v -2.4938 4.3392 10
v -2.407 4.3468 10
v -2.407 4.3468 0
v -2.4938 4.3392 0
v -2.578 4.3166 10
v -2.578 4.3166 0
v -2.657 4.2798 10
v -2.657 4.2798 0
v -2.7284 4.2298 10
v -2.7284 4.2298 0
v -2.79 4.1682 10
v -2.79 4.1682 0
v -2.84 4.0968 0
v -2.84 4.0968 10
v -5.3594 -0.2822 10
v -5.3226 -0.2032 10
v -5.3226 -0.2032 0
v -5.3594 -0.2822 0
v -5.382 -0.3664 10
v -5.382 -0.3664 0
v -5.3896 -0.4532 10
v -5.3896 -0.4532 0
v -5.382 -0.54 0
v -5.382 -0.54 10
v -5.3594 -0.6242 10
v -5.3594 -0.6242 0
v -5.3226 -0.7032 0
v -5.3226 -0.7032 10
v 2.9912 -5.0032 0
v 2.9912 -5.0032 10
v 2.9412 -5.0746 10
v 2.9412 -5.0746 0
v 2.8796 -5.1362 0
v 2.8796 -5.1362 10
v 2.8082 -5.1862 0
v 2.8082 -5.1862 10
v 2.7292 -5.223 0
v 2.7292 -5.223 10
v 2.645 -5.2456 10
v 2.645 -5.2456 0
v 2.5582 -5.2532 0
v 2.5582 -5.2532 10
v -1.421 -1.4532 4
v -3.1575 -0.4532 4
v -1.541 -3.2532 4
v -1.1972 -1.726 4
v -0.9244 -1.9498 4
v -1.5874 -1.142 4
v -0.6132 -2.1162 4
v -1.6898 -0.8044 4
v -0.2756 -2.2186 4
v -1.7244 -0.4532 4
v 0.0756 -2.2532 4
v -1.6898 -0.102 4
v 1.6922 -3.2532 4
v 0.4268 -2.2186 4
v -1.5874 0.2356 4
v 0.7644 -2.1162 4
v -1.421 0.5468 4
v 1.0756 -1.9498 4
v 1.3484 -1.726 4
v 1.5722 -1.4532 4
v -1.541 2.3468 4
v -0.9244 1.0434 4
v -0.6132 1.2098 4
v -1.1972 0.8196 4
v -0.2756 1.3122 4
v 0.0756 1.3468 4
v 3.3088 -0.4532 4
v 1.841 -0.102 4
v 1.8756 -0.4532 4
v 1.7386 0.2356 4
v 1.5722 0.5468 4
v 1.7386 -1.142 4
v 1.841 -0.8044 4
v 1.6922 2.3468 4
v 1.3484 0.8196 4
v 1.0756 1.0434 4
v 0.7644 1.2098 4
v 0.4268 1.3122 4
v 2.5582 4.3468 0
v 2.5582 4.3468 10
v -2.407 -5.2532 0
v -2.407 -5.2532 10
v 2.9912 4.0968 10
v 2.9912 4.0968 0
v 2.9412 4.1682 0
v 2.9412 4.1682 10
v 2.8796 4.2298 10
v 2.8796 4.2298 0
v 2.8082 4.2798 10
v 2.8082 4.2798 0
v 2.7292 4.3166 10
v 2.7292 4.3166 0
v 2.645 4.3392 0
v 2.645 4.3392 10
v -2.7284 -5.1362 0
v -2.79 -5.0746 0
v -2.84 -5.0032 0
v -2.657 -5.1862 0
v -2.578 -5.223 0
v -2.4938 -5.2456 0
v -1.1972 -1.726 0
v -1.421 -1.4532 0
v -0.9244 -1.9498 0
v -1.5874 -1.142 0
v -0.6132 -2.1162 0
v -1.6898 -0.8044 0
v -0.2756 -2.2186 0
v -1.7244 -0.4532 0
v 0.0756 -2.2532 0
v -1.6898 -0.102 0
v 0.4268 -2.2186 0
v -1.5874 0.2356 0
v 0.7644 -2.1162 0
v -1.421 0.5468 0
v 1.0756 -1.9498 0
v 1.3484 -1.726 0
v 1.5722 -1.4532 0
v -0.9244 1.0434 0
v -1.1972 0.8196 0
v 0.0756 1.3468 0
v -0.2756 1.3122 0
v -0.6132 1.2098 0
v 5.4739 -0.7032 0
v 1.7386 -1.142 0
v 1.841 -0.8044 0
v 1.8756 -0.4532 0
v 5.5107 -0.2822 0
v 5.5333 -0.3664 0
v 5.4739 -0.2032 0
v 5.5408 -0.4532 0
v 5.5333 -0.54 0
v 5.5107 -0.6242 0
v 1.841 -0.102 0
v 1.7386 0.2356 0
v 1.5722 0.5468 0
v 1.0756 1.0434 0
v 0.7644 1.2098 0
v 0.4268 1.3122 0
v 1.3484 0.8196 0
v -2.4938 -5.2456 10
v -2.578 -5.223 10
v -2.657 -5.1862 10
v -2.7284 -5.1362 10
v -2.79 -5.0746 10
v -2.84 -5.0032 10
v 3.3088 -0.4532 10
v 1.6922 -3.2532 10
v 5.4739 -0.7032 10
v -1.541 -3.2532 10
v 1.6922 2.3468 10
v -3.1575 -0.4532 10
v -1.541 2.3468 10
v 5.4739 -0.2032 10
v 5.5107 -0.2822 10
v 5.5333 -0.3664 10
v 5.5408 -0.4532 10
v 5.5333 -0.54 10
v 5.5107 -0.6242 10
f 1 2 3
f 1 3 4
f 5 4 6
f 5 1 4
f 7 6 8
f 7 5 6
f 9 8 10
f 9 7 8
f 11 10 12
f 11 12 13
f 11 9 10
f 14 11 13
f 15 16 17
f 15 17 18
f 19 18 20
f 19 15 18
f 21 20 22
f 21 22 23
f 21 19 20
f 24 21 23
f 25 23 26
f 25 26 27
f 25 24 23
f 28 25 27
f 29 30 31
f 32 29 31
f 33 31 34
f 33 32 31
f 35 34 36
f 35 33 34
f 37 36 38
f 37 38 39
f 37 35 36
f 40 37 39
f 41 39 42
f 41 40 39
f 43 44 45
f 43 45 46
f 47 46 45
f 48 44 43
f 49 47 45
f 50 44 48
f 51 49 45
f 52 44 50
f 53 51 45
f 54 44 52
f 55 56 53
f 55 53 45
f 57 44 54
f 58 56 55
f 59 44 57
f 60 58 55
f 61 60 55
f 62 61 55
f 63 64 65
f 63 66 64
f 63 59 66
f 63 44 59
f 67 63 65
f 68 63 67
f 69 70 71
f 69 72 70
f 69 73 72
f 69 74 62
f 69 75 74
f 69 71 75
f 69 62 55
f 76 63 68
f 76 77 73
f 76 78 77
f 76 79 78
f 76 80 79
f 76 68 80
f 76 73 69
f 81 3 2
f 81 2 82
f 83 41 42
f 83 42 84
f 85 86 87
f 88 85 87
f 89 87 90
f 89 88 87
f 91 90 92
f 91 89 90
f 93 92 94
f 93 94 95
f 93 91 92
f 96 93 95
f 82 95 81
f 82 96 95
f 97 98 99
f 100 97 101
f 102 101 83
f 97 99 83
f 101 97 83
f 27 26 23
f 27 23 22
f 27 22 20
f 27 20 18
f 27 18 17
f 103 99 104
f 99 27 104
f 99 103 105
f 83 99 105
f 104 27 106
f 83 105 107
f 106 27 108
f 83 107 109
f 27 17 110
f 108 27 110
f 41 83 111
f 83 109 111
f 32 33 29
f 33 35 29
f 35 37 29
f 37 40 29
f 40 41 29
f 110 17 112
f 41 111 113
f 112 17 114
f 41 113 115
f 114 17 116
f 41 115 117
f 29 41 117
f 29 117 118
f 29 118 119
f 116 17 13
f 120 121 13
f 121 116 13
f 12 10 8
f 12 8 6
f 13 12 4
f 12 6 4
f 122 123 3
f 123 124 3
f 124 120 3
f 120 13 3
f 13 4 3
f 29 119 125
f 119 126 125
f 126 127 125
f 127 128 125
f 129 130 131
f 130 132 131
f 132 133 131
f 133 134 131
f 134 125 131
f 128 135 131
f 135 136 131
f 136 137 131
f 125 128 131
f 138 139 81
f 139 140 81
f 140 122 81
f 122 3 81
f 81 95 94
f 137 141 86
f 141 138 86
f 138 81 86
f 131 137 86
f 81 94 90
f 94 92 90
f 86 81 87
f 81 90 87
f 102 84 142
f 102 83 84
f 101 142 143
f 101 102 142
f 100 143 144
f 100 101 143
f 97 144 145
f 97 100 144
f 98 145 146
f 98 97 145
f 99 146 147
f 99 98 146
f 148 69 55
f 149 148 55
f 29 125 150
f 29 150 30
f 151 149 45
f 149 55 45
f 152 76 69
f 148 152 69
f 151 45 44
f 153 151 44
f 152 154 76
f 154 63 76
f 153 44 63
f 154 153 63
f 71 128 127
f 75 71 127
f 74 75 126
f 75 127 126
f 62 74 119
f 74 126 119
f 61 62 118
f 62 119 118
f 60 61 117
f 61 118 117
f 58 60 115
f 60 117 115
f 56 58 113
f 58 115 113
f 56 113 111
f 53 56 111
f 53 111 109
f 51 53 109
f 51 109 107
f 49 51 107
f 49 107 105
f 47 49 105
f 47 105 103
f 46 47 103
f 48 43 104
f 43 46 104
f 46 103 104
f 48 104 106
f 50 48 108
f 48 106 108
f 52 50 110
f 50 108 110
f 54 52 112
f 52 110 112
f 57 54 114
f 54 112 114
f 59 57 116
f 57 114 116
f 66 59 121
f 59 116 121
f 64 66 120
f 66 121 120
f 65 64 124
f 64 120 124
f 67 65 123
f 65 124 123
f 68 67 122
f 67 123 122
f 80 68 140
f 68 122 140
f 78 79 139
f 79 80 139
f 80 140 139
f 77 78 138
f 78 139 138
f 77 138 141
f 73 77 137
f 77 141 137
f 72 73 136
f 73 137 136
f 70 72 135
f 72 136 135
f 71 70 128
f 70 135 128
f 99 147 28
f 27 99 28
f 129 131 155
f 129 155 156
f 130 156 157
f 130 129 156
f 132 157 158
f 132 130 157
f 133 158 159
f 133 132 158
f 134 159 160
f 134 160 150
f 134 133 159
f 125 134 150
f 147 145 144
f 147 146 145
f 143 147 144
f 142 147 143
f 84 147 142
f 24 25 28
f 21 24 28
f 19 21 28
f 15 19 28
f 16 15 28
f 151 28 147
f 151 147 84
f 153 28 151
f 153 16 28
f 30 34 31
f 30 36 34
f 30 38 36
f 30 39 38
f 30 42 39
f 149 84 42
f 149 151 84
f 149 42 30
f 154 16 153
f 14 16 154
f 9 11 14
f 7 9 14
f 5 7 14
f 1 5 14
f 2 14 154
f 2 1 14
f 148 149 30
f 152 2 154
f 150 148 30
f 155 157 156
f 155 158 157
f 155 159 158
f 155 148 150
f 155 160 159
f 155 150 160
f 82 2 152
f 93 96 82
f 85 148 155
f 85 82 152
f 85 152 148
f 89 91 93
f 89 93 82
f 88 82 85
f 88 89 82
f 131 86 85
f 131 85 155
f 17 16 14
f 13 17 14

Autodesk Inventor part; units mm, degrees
ref_plane "YZ Plane" through (0, 0, 0) normal (1, 0, 0) x (0, 1, 0)
ref_plane "XZ Plane" through (0, 0, 0) normal (0, 1, 0) x (-1, 0, 0)
ref_plane "XY Plane" through (0, 0, 0) normal (0, 0, 1) x (1, 0, 0)
sketch "Sketch1" plane through (0, 0, 0) normal (0, 0, 1) x (1, 0, 0)
  circle A0 centre (0.0756, -0.4532) radius 1.5 projected
  circle A1 centre (0.0756, -0.4532) radius 1.7 projected
  circle A2 centre (0.0756, -0.4532) radius 1.7 projected
  circle A3 centre (0.0756, -0.4532) radius 1.8
  line L0 (2.8469, 4.3468) -> (5.6182, -0.4532)
  line L1 (5.6182, -0.4532) -> (2.8469, -5.2532)
  line L2 (2.8469, -5.2532) -> (-2.6957, -5.2532)
  line L3 (-2.6957, -5.2532) -> (-5.4669, -0.4532)
  line L4 (-5.4669, -0.4532) -> (-2.6957, 4.3468)
  line L5 (-2.6957, 4.3468) -> (2.8469, 4.3468)
  line L6 (-1.558, 1.3468) -> (2.6621, 1.3468) construction
  point P0 (0, 0)
  dimension "d0" = 0.1
  dimension "d1" = 3
extrude "Extrusion1" add sketch "Sketch1" along normal blind 4 contours L0 L1 L2 L3 L4 L5
sketch "Sketch2" plane through (0, 0, 4) normal (0, 0, 1) x (1, 0, 0)
  line L0 (-2.6957, 4.3468) -> (-5.4669, -0.4532) projected
  line L1 (-5.4669, -0.4532) -> (-2.6957, -5.2532) projected
  line L2 (-2.6957, -5.2532) -> (2.8469, -5.2532) projected
  line L3 (2.8469, -5.2532) -> (5.6182, -0.4532) projected
  line L4 (5.6182, -0.4532) -> (2.8469, 4.3468) projected
  line L5 (2.8469, 4.3468) -> (-2.6957, 4.3468) projected
  circle A0 centre (0.0756, -0.4532) radius 1.8 projected
  line L6 (-3.1575, -0.4532) -> (-1.541, 2.3468)
  line L7 (-1.541, 2.3468) -> (1.6922, 2.3468)
  line L8 (1.6922, 2.3468) -> (3.3088, -0.4532)
  line L9 (3.3088, -0.4532) -> (1.6922, -3.2532)
  line L10 (1.6922, -3.2532) -> (-1.541, -3.2532)
  line L11 (-1.541, -3.2532) -> (-3.1575, -0.4532)
  point P0 (0, 0)
  dimension "d4" = 2
extrude "Extrusion2" add sketch "Sketch2" along normal blind 6 contours L5 L4 L3 L2 L1 L0
fillet "Fillet1" radius 0.5 6 edges at (-5.4669, -0.4532, 5) (-2.6957, 4.3468, 5) (2.8469, 4.3468, 5) (5.6182, -0.4532, 5) (-2.6957, -5.2532, 5) (2.8469, -5.2532, 5)
thread "Thread1" size "M3x0.5" class "6H" standard "ANSI Metric M Profile" full length
properties part number "TurretTighteningNut"
